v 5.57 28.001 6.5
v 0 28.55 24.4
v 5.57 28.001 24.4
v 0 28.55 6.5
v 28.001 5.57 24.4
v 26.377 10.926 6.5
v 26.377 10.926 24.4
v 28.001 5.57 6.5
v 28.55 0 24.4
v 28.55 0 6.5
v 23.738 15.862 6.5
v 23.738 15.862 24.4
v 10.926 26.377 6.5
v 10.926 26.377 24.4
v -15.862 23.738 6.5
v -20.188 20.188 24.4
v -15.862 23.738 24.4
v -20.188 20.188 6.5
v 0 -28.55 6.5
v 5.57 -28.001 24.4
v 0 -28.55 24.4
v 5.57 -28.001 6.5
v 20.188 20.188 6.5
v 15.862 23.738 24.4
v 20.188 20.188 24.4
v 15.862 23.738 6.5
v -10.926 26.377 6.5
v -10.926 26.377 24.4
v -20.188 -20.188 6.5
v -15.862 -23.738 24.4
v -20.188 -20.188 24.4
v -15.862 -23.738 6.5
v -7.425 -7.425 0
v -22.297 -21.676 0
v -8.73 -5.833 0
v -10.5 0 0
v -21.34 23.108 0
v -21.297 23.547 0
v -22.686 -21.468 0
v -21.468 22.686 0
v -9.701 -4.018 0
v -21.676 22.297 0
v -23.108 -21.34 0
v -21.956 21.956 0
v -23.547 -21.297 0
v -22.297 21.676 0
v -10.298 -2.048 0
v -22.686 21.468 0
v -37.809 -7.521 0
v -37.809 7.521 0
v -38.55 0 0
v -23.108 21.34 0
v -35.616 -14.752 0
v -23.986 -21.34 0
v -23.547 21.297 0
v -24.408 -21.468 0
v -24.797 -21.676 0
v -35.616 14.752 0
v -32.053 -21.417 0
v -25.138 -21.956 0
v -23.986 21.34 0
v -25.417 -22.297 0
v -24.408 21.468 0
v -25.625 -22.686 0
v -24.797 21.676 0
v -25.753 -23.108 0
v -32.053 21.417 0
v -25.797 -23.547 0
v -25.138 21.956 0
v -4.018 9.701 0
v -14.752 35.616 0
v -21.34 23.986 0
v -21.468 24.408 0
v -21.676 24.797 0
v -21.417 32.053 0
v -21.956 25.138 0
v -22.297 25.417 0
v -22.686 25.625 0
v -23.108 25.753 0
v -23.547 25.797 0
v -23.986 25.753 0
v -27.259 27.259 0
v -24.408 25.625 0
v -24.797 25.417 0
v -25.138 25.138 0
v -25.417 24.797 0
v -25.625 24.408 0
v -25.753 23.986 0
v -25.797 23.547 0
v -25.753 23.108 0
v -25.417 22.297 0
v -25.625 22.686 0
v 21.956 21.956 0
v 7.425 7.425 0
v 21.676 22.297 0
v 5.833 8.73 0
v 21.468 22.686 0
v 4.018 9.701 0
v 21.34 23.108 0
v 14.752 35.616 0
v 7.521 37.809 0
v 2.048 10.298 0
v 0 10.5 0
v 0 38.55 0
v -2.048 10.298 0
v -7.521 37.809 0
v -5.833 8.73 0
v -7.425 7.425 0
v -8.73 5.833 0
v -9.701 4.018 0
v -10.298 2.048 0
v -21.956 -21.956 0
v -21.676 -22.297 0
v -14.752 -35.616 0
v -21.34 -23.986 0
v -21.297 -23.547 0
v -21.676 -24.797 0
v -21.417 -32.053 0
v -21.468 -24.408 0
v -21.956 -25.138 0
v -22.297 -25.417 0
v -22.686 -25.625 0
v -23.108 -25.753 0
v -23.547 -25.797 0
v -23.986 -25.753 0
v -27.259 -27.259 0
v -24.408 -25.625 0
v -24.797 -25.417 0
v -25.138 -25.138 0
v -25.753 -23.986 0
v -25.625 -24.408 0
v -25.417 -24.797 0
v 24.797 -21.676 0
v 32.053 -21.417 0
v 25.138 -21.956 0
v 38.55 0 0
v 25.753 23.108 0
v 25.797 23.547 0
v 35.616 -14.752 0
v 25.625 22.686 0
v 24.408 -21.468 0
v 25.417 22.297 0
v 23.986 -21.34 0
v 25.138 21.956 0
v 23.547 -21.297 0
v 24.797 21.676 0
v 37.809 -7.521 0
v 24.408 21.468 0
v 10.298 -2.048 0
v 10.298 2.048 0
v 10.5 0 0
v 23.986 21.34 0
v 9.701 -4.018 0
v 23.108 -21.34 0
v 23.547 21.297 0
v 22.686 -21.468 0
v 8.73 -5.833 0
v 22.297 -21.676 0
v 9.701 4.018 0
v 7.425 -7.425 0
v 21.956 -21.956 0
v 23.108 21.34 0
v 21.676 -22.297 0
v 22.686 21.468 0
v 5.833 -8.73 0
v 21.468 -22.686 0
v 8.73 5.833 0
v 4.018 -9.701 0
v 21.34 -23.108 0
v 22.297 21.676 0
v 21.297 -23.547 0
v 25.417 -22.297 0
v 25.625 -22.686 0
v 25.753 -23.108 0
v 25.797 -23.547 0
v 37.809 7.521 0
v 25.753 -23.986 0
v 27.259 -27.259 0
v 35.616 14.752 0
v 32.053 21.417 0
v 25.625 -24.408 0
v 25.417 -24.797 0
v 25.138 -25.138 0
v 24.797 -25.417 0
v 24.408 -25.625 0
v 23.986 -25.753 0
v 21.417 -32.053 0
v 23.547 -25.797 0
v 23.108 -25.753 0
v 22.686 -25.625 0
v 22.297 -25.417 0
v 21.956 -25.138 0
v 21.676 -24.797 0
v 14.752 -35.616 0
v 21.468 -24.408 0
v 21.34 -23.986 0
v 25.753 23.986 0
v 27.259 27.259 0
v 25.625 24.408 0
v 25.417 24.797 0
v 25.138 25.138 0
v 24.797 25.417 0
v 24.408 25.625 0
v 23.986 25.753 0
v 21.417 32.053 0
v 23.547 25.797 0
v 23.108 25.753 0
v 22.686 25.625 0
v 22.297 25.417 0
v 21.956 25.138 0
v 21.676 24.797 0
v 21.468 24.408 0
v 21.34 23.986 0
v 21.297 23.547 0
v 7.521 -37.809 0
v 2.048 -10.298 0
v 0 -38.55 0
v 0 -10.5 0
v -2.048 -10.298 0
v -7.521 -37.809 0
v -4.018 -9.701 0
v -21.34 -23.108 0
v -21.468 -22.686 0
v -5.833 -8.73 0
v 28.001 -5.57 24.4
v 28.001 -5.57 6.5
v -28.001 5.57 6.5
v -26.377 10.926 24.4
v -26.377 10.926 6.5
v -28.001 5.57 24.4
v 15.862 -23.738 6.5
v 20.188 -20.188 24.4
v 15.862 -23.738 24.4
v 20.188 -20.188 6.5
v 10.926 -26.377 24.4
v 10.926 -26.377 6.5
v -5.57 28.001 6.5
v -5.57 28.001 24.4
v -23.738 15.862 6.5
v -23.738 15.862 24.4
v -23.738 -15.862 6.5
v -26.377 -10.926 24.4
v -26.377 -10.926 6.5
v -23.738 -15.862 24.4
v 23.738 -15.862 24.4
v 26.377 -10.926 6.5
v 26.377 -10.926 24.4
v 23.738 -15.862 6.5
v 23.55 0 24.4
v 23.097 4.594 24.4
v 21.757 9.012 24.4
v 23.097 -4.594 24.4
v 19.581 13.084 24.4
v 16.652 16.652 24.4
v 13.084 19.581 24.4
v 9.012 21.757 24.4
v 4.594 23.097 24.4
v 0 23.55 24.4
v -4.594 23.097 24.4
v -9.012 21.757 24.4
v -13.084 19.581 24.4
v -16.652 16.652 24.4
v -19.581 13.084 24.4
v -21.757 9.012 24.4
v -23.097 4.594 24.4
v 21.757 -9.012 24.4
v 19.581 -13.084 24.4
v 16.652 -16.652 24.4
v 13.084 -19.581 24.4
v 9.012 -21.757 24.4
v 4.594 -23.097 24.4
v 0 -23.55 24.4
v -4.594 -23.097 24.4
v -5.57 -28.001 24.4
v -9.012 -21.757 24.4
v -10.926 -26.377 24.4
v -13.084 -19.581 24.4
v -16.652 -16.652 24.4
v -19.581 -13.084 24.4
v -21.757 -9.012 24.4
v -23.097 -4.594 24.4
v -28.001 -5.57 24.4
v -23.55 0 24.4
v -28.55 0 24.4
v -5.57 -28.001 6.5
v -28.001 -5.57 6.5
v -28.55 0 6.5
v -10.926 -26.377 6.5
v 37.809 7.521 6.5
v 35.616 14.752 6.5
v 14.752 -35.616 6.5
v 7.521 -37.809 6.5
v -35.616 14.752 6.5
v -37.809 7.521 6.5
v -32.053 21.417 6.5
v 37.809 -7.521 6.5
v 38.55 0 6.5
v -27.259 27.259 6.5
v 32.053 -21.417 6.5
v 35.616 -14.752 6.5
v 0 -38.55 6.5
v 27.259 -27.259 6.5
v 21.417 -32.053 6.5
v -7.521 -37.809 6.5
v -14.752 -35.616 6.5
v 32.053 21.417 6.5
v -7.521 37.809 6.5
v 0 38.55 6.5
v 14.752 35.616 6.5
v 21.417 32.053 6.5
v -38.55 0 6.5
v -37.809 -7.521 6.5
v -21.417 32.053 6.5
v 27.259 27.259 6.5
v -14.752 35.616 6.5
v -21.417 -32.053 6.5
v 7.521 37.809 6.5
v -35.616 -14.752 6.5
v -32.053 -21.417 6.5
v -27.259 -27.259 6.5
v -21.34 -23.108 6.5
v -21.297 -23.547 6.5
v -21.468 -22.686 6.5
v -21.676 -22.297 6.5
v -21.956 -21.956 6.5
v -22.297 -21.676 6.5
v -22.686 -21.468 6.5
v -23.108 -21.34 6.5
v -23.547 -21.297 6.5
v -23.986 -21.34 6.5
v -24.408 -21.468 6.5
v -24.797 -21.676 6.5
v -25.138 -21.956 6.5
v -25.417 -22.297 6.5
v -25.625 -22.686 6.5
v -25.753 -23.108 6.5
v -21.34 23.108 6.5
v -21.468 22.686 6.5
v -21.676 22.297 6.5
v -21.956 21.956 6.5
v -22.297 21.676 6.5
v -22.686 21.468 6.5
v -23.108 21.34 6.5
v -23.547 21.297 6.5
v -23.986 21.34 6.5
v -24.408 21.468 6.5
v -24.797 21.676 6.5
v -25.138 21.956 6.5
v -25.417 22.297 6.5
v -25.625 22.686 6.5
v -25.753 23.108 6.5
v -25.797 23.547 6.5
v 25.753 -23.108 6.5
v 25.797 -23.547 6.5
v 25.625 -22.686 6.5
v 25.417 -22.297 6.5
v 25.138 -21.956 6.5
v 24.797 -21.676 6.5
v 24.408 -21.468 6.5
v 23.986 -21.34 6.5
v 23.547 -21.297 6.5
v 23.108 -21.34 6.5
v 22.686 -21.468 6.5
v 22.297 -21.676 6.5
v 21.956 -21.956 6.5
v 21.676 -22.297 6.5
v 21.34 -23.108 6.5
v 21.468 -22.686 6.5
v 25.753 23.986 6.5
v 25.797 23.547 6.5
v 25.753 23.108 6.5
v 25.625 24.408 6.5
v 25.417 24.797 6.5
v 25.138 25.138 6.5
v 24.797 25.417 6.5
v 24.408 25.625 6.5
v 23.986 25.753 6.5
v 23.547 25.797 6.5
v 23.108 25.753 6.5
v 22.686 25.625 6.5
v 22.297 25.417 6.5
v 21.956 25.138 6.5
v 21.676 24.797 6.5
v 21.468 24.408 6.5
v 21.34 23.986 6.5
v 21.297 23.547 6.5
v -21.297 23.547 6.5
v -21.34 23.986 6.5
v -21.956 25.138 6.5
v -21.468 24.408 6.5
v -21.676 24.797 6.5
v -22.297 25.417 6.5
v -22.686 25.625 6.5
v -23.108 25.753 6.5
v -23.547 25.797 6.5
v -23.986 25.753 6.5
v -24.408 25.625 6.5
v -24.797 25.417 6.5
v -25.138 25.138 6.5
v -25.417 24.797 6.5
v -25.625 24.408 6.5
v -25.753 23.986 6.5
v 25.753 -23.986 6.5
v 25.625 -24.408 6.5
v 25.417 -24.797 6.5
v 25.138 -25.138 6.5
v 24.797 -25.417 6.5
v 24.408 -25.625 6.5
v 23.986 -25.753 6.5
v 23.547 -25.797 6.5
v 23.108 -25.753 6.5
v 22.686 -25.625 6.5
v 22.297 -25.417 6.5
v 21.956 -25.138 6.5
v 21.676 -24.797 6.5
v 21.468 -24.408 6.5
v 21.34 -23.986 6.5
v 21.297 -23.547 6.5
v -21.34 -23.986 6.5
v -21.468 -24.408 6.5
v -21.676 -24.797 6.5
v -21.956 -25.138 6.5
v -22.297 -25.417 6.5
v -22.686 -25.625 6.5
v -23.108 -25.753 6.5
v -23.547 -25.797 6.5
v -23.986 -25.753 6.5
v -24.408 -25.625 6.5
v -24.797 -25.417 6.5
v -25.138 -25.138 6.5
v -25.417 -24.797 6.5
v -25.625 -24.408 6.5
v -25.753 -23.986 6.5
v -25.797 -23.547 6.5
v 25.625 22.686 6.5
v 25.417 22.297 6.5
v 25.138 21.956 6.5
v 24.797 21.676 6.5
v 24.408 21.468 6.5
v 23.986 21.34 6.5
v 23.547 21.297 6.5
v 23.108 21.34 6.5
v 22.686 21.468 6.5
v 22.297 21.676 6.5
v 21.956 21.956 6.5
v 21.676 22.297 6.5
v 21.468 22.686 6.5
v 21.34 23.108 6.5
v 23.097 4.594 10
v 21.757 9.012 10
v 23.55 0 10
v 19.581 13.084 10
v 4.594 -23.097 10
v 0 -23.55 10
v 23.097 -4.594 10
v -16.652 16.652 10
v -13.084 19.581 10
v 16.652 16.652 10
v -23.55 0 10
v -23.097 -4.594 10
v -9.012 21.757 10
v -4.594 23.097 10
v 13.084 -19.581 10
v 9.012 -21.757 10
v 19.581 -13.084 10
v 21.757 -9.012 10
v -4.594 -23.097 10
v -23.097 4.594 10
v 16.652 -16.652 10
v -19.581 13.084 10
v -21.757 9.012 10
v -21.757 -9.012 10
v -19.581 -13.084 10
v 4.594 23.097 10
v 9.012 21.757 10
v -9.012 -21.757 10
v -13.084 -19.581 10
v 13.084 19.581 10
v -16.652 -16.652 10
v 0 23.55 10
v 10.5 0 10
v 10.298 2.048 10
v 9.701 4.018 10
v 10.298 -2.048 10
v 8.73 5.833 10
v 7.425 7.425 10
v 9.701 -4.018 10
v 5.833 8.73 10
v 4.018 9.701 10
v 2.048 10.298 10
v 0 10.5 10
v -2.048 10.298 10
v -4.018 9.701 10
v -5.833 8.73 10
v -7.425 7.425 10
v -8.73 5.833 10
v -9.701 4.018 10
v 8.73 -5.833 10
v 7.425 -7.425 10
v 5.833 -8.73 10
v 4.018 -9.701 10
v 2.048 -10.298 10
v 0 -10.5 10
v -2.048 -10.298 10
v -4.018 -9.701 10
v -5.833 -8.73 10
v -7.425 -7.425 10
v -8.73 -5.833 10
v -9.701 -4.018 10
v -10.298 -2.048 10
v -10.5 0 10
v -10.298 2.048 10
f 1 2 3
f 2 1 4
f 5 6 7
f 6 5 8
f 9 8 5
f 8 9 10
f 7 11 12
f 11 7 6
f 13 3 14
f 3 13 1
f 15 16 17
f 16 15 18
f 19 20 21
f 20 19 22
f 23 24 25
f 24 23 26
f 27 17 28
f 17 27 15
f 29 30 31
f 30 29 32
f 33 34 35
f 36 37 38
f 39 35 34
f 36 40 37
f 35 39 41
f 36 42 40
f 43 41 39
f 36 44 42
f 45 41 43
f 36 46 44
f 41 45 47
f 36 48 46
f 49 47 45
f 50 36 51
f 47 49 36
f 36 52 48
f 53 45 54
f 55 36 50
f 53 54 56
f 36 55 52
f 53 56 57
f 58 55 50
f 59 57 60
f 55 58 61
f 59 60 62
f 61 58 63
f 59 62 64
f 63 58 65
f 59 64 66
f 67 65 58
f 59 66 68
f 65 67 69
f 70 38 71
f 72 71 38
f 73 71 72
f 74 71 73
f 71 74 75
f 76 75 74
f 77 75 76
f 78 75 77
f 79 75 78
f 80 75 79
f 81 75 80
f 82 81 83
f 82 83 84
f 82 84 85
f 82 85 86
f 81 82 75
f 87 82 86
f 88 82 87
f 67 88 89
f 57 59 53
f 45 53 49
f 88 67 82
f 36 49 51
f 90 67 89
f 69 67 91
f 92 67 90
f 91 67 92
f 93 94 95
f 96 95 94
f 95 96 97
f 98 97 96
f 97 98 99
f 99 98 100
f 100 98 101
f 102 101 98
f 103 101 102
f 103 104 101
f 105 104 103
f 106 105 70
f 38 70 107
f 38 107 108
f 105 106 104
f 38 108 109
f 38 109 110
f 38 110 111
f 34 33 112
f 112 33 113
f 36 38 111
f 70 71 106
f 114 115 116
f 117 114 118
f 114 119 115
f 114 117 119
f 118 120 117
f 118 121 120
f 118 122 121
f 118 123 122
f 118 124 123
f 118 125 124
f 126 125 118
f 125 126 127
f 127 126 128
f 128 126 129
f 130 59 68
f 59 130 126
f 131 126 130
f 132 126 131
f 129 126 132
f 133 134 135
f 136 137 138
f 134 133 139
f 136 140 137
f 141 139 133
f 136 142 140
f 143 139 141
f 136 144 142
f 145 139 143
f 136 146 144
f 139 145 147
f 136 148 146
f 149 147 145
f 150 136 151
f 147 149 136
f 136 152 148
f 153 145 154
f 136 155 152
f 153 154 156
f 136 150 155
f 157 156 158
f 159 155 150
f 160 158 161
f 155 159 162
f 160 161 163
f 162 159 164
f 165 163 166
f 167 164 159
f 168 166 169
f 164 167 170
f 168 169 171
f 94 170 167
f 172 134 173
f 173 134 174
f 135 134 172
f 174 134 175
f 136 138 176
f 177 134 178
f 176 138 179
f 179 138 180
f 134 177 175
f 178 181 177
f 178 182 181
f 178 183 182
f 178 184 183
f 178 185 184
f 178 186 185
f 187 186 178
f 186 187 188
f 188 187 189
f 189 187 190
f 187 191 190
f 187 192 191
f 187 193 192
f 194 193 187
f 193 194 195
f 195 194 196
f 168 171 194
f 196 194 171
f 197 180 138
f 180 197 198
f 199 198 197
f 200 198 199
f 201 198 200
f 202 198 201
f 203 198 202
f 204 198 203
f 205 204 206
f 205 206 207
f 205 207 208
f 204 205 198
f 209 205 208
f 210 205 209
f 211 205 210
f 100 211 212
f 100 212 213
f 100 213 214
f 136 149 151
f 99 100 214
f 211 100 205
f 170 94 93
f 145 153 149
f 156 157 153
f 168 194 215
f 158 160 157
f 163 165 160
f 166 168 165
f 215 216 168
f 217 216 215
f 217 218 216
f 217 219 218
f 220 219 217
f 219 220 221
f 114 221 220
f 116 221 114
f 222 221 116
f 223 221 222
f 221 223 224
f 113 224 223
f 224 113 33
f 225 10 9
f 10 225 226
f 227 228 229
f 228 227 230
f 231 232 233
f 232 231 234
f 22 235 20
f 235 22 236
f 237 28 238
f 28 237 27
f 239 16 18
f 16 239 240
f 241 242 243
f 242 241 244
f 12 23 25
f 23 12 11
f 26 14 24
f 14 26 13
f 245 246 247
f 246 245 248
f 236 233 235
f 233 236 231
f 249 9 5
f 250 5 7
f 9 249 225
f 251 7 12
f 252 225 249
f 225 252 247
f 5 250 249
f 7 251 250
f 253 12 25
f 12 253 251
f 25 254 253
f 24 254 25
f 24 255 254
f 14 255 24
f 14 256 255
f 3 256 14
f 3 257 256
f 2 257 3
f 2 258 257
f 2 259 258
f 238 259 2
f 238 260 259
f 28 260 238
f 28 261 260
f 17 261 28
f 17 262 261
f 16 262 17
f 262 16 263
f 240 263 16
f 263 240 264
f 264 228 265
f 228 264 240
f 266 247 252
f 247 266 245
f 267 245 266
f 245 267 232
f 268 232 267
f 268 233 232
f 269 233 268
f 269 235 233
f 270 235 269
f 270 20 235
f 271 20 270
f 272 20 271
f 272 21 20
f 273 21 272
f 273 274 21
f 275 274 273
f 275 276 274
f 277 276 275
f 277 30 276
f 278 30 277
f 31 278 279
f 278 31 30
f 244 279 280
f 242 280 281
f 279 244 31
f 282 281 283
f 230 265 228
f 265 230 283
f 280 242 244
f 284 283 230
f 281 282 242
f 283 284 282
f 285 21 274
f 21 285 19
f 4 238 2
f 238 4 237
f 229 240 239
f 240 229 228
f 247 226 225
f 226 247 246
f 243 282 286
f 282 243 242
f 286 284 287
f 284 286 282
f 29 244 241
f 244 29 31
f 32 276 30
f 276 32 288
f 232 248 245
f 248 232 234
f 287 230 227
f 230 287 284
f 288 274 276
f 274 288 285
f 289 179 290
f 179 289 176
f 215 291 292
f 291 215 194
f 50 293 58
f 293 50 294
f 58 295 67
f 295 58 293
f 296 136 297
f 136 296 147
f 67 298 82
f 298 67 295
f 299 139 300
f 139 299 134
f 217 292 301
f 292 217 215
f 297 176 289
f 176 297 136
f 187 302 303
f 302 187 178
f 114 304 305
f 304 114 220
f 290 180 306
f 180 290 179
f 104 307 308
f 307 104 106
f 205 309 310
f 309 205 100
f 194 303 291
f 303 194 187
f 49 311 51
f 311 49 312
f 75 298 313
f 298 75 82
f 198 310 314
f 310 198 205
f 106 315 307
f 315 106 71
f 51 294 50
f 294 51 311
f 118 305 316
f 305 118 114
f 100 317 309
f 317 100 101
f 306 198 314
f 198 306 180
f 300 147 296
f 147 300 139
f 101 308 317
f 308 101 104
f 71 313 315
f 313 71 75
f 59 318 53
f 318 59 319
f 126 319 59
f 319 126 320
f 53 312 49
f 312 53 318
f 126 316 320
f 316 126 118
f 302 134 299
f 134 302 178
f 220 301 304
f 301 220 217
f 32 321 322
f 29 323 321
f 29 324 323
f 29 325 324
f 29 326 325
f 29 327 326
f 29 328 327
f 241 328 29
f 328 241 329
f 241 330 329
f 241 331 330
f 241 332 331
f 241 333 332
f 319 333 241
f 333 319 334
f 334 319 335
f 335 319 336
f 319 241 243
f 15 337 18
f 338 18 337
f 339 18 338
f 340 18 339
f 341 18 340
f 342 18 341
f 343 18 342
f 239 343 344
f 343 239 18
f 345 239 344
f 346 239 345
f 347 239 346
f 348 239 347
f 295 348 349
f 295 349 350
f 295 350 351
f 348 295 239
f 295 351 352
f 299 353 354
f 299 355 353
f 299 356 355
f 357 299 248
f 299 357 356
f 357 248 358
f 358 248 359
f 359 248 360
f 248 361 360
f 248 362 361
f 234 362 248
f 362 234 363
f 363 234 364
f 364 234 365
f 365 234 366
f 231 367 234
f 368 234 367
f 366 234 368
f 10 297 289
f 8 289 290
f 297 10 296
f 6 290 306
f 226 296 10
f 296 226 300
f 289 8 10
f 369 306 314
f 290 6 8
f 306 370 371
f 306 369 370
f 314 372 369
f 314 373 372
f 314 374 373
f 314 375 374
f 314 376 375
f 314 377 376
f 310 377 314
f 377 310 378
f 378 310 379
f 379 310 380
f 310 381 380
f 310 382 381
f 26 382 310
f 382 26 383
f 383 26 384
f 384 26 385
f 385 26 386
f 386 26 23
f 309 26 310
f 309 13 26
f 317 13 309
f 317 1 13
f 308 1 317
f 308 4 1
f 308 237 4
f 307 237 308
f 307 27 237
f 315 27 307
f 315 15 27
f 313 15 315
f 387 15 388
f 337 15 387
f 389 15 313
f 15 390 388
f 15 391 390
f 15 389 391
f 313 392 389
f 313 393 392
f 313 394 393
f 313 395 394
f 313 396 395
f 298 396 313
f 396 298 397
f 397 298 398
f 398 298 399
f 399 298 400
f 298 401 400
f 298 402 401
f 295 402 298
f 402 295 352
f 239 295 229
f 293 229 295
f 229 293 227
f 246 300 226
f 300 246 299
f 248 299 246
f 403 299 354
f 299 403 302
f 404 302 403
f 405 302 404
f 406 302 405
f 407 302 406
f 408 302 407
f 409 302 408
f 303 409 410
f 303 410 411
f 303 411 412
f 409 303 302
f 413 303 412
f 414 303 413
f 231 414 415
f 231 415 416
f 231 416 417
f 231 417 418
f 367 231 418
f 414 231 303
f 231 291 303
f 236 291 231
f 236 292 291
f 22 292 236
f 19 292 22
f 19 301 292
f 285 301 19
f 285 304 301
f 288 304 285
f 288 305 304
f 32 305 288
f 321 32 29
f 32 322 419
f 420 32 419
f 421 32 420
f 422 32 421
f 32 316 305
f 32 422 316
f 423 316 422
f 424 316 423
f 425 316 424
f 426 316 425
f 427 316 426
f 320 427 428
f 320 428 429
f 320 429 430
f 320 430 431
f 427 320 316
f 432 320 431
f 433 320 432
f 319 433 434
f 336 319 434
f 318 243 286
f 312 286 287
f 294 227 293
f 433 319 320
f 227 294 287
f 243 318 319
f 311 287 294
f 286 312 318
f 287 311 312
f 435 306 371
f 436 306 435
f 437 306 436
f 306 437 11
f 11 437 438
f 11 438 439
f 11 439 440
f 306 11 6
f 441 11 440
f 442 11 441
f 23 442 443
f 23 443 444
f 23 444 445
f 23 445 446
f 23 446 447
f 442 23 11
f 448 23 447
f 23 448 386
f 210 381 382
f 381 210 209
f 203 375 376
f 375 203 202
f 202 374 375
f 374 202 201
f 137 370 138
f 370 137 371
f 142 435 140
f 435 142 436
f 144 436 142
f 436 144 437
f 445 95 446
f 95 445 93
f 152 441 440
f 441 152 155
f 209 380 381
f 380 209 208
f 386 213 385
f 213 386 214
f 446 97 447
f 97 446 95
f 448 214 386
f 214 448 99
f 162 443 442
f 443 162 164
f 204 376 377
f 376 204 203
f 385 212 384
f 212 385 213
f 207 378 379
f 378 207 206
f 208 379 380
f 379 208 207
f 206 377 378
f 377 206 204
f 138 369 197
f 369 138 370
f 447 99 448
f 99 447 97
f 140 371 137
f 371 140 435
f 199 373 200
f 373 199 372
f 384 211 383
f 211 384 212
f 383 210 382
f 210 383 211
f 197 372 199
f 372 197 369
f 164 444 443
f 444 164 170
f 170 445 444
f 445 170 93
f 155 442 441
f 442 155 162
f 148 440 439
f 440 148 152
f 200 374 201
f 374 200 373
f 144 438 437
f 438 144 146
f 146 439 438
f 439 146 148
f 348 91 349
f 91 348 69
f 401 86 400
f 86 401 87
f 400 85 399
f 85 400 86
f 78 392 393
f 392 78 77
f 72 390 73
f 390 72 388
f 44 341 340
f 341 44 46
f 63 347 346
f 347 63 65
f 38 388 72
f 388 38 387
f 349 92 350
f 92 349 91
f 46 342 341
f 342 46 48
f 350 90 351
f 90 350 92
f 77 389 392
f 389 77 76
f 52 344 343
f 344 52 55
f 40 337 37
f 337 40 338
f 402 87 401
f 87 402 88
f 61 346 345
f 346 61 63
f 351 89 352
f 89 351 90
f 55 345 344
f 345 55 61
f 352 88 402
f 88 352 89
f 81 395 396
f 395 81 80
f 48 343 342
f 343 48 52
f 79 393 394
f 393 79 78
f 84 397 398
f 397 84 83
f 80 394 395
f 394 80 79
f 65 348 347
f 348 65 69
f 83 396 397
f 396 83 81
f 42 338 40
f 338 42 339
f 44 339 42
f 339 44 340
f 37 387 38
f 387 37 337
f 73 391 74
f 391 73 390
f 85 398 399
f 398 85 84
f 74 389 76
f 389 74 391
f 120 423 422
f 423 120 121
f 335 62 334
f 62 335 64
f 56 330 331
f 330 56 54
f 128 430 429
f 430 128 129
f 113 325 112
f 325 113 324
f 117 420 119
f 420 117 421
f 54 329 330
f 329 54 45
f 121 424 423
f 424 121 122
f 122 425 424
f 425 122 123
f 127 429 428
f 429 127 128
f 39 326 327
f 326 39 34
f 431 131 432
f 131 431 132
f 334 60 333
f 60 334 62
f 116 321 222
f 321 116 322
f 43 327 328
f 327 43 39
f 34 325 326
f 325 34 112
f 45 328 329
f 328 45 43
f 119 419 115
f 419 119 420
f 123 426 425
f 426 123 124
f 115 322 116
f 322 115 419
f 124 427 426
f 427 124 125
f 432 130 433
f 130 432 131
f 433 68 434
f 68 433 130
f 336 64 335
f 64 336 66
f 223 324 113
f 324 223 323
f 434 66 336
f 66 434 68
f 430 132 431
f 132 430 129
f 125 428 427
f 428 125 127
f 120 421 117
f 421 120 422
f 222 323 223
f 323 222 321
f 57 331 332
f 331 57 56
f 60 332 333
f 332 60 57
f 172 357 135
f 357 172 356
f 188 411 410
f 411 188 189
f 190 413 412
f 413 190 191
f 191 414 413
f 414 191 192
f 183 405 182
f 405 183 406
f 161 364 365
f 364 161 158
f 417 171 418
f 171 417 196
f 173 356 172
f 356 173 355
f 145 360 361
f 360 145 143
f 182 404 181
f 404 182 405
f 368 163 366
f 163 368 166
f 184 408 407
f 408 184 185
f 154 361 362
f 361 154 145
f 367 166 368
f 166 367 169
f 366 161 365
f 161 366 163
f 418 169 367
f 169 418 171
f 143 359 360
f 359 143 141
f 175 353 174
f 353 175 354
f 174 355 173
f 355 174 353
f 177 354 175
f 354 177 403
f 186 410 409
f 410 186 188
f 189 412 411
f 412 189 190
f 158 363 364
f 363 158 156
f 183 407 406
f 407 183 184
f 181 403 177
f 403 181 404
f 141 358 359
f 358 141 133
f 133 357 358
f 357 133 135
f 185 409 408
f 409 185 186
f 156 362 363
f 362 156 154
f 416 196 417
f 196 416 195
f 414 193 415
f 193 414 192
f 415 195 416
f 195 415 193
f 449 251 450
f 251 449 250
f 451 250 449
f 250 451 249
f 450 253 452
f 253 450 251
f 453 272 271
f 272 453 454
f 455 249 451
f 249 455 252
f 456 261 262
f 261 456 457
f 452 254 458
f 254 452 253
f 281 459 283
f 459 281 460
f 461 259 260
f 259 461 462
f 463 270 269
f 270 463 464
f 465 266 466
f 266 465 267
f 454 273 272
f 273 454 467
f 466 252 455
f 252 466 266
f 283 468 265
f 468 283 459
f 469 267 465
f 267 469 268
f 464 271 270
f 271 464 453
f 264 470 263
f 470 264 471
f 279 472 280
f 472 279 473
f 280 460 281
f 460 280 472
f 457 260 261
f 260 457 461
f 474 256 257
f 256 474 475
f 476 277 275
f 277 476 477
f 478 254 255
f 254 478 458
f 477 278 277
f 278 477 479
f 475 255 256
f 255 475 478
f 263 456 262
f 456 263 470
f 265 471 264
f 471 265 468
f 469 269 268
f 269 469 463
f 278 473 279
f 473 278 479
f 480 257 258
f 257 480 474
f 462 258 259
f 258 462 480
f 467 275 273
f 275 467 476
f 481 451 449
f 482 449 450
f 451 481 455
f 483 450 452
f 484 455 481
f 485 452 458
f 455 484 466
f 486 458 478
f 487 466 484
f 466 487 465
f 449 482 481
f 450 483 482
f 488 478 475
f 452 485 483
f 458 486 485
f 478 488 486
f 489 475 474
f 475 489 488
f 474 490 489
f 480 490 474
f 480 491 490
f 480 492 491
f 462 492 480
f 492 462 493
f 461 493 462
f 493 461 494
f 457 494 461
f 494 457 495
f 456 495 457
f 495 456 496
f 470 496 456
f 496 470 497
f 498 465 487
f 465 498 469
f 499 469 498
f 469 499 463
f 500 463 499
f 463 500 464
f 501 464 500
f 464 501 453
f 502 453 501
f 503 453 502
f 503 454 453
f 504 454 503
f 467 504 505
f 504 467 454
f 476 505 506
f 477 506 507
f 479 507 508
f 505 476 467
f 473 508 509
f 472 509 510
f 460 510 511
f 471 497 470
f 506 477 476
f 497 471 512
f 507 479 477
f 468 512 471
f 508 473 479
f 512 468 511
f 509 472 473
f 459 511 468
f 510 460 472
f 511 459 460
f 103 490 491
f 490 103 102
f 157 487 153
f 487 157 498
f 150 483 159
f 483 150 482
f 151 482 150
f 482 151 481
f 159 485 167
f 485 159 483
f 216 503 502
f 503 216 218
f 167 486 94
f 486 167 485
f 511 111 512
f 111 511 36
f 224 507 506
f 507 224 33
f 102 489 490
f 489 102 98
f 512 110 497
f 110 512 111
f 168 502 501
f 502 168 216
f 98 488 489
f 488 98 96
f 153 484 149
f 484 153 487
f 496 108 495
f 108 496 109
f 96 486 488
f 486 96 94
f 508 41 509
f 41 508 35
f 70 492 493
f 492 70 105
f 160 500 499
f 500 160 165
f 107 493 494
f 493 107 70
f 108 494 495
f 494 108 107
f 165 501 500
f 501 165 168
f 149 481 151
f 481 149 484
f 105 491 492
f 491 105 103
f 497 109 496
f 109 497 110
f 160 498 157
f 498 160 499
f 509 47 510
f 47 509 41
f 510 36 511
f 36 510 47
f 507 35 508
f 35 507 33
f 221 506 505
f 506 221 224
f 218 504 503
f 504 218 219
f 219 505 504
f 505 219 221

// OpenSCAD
$fn = 32;

// ----------------------------------------------------------------------
// Bearing housing: seat for 6204 (47 x 14 mm), 57.1 mm body
// ----------------------------------------------------------------------

// --- parameters (mm) ---
housing_d = 57.1;         // housing outside diameter
housing_h = 24.4;         // overall housing height
wall_t = 5;               // wall thickness
seat_d = 47.1;            // 6204 seat, 0.1 mm clearance
seat_h = 14.4;            // pocket depth
shoulder = 5;             // shoulder under the bearing
pass_d = 21;              // shaft passage
flange_d = 77.1;          // mounting flange diameter
flange_t = 5;             // flange thickness
bolt_d = 4.5;             // flange bolt clearance
bolt_r = 33.3;            // flange bolt circle radius

module body() {
  cylinder(h = housing_h, d = housing_d);
}

module flange() {
  /* flange sunk 1.5 mm into the body */
  cylinder(h = flange_t + 1.5, d = flange_d);
}

difference() {
  union() {
    body();
    flange();
  }
  translate([0, 0, housing_h - seat_h]) cylinder(h = seat_h + 1, d = seat_d);
  translate([0, 0, -1]) cylinder(h = housing_h - seat_h + 1, d = pass_d);
  for (i = [0 : 3]) rotate([0, 0, 45 + i * 90]) translate([bolt_r, 0, -1])
    cylinder(h = flange_t + 3, d = bolt_d);
}
